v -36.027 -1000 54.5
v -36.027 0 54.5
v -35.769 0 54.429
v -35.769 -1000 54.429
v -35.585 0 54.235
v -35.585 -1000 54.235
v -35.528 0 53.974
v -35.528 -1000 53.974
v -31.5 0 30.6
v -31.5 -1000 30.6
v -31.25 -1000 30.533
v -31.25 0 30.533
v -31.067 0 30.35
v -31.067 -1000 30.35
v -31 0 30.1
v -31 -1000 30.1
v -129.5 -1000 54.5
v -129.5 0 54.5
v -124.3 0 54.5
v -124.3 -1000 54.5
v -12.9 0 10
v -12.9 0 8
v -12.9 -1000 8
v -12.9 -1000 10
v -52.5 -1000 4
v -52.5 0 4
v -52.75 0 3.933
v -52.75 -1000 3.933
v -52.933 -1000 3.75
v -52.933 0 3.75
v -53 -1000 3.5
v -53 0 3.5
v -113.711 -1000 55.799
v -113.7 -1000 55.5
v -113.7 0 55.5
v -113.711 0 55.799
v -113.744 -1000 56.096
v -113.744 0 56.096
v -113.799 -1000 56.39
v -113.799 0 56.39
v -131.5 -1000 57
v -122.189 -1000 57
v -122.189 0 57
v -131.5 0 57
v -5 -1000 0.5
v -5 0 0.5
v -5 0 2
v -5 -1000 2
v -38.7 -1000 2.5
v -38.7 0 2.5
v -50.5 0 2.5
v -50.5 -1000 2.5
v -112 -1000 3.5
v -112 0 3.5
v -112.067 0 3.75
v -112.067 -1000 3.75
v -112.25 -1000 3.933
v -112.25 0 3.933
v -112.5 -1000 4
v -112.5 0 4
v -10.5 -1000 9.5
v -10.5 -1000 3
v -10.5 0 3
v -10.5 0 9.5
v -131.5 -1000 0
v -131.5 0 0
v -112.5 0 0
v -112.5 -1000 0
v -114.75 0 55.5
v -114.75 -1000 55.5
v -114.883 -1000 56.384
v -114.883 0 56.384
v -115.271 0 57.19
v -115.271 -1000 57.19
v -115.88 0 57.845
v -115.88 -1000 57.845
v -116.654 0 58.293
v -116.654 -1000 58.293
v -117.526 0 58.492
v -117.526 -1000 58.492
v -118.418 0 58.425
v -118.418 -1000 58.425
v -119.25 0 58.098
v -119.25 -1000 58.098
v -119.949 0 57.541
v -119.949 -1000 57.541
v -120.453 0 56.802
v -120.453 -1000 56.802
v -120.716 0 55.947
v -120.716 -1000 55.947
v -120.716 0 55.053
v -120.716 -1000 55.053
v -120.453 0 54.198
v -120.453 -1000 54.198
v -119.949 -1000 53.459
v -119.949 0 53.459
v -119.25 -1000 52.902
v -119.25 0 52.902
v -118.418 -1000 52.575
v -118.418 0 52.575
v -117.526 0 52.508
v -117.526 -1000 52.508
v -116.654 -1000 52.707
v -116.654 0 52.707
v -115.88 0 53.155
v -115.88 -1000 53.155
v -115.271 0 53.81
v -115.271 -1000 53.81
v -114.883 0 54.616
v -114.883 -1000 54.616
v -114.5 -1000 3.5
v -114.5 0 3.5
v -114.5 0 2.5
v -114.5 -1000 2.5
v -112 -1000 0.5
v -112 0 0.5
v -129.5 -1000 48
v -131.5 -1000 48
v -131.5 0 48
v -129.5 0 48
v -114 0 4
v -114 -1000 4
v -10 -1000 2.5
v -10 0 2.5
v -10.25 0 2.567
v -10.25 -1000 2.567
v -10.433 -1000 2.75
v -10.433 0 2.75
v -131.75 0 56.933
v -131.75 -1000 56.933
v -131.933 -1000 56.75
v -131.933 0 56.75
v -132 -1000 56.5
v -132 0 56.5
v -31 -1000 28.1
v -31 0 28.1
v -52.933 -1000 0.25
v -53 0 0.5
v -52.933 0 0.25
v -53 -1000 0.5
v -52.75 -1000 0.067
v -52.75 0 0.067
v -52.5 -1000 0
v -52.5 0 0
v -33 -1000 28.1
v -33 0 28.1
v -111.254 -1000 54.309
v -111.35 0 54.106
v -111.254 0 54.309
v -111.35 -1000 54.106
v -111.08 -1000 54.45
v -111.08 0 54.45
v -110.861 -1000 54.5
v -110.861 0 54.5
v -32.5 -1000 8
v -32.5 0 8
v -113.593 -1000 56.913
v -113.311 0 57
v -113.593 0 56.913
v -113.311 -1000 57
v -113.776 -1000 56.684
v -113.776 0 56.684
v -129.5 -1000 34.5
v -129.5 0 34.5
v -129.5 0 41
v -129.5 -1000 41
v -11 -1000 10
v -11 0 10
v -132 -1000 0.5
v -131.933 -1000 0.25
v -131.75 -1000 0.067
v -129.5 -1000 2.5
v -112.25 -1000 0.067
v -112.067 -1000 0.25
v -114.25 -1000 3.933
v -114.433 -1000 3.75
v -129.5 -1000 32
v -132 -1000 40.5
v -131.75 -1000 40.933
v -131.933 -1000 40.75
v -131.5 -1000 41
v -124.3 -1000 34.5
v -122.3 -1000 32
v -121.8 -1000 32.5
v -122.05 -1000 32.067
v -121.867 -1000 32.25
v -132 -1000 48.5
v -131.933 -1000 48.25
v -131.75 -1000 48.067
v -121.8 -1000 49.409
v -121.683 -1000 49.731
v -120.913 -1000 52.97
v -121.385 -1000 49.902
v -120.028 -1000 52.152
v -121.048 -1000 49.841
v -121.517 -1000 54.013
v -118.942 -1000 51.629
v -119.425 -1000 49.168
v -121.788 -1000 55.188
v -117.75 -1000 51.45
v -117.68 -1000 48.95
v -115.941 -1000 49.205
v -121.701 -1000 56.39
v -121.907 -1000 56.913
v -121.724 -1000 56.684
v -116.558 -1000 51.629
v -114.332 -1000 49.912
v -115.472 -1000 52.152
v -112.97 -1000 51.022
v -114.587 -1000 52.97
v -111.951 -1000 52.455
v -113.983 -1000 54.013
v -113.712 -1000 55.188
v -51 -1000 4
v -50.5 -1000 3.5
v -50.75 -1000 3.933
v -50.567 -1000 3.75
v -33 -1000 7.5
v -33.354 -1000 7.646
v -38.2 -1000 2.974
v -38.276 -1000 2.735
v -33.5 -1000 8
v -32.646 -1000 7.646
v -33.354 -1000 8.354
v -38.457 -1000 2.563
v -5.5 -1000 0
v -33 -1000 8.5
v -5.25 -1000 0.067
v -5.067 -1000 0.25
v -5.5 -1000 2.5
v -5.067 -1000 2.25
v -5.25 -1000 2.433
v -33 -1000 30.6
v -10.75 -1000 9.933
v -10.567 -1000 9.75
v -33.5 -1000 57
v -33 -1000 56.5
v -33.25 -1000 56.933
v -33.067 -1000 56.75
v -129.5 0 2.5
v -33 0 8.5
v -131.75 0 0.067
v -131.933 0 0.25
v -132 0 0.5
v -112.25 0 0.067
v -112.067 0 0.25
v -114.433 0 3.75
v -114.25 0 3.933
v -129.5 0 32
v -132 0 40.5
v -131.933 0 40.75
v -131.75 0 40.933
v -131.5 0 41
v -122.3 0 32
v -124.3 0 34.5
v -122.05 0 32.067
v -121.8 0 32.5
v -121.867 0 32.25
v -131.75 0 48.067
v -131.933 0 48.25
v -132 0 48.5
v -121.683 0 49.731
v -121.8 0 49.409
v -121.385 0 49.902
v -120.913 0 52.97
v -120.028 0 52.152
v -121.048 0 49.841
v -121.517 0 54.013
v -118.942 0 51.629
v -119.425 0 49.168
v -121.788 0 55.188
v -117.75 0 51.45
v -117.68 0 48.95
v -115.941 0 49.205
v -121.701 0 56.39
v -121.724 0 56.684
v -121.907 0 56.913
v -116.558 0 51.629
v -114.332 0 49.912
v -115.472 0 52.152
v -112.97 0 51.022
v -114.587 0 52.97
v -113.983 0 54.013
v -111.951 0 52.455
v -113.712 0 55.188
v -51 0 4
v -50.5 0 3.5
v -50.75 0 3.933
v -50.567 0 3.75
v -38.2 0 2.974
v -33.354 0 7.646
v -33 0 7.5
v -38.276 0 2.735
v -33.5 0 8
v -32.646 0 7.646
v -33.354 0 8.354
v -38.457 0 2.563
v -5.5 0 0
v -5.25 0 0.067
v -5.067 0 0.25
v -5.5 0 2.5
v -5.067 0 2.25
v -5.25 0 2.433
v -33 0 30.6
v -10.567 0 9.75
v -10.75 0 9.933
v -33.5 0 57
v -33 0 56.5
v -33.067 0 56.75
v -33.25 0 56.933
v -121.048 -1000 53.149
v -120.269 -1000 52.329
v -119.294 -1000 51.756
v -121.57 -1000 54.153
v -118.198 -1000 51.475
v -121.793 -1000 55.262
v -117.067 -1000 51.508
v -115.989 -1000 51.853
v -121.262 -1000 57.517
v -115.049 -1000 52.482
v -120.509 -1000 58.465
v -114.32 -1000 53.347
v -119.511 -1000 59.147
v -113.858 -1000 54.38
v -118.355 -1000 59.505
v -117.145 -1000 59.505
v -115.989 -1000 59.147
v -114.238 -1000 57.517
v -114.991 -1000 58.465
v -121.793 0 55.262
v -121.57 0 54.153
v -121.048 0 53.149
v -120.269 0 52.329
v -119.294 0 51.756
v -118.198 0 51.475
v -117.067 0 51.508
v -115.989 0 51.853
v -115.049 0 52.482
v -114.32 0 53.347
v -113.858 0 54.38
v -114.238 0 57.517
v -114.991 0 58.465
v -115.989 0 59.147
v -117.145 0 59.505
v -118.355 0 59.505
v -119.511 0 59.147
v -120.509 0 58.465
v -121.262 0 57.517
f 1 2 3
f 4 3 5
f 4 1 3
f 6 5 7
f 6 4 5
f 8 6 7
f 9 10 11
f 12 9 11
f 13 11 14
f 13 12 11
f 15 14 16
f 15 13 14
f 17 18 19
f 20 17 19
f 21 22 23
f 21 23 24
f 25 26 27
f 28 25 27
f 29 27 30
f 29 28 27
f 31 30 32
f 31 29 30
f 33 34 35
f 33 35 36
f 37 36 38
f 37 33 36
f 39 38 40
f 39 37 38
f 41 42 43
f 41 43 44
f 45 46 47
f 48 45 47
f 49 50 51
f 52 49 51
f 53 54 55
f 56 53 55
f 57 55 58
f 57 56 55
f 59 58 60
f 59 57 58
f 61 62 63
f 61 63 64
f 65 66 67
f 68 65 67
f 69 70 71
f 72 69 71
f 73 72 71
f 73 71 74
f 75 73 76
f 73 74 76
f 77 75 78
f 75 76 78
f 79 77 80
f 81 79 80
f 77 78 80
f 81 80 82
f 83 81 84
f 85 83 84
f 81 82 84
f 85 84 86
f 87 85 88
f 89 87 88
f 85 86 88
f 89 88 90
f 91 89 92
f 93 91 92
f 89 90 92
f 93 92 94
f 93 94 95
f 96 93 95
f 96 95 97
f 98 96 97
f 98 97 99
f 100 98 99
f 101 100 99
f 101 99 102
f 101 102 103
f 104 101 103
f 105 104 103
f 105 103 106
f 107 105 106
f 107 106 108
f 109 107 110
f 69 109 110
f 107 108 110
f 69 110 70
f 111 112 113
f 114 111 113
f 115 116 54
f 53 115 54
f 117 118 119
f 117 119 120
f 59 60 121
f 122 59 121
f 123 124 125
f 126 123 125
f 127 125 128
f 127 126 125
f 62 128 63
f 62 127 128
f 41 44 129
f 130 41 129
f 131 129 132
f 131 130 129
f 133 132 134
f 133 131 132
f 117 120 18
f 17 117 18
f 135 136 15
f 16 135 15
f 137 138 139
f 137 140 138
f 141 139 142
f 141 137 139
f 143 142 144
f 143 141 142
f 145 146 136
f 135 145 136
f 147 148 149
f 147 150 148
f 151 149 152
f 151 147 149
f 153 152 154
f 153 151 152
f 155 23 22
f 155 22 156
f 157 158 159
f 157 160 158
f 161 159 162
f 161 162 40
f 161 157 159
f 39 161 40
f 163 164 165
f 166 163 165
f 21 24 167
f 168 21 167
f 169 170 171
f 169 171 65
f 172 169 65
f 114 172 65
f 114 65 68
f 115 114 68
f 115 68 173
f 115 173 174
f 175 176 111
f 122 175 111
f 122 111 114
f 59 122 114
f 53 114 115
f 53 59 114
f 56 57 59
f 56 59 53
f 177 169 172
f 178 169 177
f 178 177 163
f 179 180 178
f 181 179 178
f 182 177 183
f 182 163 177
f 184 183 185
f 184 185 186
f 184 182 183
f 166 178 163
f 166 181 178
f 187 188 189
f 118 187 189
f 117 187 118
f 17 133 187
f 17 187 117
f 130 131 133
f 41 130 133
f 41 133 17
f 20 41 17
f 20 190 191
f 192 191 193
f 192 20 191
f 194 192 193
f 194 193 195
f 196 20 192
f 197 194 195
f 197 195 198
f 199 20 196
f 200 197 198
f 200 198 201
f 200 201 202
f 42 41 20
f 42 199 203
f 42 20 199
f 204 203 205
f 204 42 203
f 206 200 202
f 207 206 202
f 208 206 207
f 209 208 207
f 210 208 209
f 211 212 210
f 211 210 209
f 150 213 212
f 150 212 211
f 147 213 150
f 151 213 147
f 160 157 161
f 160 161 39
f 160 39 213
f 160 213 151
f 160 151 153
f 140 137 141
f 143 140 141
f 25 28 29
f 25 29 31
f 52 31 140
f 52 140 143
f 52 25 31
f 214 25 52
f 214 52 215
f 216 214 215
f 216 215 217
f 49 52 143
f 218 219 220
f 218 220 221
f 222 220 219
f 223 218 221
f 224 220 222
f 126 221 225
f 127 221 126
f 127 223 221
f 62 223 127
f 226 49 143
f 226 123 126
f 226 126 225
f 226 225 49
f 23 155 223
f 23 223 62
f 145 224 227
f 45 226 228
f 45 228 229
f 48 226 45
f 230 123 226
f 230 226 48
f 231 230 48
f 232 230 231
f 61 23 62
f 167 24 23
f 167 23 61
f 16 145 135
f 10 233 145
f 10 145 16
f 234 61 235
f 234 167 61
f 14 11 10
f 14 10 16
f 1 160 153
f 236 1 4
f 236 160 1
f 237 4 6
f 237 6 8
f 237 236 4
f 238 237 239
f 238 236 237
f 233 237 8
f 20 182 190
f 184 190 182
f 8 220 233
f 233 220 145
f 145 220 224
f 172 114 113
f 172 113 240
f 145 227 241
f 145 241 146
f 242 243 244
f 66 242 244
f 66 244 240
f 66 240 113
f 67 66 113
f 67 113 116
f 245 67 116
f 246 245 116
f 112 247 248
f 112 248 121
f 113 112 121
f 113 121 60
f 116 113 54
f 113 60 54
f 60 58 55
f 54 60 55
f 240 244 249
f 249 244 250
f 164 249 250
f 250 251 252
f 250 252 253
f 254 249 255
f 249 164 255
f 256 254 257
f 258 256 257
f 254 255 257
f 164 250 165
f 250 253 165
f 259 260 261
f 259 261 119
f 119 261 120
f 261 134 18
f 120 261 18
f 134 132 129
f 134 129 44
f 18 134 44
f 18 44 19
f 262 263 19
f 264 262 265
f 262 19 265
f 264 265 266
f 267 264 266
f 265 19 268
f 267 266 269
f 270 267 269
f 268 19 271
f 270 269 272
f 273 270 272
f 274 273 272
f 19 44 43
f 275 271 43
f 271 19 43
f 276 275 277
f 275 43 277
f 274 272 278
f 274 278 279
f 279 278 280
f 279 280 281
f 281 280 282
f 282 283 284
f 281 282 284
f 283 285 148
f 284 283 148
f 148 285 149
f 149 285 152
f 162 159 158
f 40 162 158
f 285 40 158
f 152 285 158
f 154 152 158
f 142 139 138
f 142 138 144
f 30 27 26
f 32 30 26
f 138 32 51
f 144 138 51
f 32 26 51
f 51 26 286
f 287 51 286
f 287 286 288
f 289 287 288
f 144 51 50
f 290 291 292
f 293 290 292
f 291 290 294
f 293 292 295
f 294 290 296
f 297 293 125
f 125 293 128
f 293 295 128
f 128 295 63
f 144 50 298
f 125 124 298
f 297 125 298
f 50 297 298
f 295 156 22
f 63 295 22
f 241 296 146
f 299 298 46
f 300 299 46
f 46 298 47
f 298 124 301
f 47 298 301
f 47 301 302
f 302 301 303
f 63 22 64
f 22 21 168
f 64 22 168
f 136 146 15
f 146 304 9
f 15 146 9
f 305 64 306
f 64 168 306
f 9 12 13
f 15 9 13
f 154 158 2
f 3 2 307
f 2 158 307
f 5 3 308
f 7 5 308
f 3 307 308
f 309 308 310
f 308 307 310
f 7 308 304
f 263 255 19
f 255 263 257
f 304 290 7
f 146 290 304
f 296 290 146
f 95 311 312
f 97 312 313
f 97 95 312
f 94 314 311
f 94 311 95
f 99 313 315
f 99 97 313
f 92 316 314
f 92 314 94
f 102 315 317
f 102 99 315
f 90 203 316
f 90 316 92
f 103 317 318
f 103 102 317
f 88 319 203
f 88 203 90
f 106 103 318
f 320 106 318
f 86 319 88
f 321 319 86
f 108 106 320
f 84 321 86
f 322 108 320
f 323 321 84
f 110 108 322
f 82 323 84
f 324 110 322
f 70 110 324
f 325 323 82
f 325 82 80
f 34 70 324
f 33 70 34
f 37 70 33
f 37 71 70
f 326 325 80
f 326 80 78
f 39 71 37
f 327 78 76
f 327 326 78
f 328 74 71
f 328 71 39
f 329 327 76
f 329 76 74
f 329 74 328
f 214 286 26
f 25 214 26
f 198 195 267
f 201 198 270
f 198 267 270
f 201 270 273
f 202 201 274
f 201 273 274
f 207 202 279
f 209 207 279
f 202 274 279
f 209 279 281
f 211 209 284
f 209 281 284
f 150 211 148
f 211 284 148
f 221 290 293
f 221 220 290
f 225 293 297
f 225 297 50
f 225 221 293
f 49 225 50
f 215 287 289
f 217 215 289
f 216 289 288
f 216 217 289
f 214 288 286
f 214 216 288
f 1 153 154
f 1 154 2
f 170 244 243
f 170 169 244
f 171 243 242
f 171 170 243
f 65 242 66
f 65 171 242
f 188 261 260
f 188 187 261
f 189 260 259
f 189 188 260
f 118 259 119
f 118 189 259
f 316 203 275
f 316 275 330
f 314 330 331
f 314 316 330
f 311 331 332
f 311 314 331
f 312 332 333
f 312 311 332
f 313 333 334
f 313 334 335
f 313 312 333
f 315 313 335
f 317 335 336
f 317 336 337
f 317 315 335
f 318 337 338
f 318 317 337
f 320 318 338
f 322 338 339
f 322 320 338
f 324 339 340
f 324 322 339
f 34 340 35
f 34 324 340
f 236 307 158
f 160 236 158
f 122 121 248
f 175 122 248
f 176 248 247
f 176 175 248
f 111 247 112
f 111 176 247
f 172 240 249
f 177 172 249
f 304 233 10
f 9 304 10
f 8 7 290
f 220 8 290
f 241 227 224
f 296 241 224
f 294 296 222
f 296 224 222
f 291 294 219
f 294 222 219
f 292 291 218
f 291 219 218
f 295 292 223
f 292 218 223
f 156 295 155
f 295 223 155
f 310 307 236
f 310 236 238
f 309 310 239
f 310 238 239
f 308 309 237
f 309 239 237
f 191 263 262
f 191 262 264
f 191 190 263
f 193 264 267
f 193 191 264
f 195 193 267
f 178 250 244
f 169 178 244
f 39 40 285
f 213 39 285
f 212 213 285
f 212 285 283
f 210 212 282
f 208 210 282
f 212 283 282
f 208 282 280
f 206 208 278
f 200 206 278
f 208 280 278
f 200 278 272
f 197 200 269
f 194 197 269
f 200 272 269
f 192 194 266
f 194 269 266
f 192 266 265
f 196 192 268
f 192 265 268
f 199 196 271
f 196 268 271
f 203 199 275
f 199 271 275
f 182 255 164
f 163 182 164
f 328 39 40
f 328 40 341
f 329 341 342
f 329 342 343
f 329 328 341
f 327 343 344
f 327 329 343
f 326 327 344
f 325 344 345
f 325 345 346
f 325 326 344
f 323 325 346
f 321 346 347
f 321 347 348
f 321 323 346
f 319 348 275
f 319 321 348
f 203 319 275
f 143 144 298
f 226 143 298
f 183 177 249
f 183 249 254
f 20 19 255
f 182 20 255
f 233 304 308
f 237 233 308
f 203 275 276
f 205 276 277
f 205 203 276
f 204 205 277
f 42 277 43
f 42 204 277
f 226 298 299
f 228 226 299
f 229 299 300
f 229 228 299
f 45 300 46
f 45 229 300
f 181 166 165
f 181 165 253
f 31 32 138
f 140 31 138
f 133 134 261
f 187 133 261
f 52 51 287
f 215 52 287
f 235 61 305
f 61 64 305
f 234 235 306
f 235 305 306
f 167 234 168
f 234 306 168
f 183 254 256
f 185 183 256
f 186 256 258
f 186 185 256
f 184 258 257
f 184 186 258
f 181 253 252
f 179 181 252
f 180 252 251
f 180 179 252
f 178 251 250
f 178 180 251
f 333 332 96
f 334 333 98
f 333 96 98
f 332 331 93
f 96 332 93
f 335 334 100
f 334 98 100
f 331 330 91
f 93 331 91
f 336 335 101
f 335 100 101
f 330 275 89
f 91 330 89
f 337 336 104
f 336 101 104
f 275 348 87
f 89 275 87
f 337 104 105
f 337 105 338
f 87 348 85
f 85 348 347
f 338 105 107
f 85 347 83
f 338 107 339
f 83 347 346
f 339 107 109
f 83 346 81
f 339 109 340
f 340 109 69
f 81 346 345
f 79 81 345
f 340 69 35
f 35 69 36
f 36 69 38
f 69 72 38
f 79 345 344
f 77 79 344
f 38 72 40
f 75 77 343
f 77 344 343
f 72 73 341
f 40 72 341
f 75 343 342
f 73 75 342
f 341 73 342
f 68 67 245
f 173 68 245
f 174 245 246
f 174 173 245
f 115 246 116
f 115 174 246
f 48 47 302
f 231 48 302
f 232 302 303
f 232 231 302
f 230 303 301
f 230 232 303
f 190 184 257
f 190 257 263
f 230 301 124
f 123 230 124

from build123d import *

# Parameters (mm, degrees)
F1_DEPTH = 1000
F2_R     = 0.5
F4_DEPTH = 1000
F5_W     = 2
F5_H     = 2.5
F5_W_2   = 2.4
F5_H_2   = 2
F6_DEPTH = 1000
F7_R     = 0.5
F8_R     = 3
F9_DEPTH = 1000


# Not quite as in the source:
# - a feature names something its author has since deleted; it is built from what else it names


with BuildPart() as f1:
    # F0 (on Front) → F1 (new body)
    with BuildSketch(Plane.XZ):
        with BuildLine():
            Line((-33, 57), (-113.9880191388, 57))
            ThreePointArc((-113.9880191388, 57), (-117.75, 51.45), (-121.5119808612, 57))
            Line((-121.5119808612, 57), (-132, 57))
            Line((-132, 57), (-132, 48))
            Line((-132, 48), (-129.5, 48))
            Line((-129.5, 48), (-129.5, 54.5))
            Line((-129.5, 54.5), (-124.3, 54.5))
            Line((-124.3, 54.5), (-124.3, 34.5))
            Line((-124.3, 34.5), (-129.5, 34.5))
            Line((-129.5, 34.5), (-129.5, 41))
            Line((-129.5, 41), (-132, 41))
            Line((-132, 41), (-132, 0))
            Line((-132, 0), (-112, 0))
            Line((-112, 0), (-112, 4))
            Line((-112, 4), (-114.5, 4))
            Line((-114.5, 4), (-114.5, 2.5))
            Line((-114.5, 2.5), (-129.5, 2.5))
            Line((-129.5, 2.5), (-129.5, 32))
            Line((-129.5, 32), (-121.8, 32))
            Line((-121.8, 32), (-121.8, 50.3521849295))
            ThreePointArc((-121.8, 50.3521849295), (-115.3481082383, 49.4062806132), (-111.2767859606, 54.5))
            Line((-111.2767859606, 54.5), (-35.5, 54.5))
            Line((-35.5, 54.5), (-38.2252045227, 2.5))
            Line((-38.2252045227, 2.5), (-50.5, 2.5))
            Line((-50.5, 2.5), (-50.5, 4))
            Line((-50.5, 4), (-53, 4))
            Line((-53, 4), (-53, 0))
            Line((-53, 0), (-5, 0))
            Line((-5, 0), (-5, 2.5))
            Line((-5, 2.5), (-10.5, 2.5))
            Line((-10.5, 2.5), (-10.5, 8))
            Line((-10.5, 8), (-33, 8))
            Line((-33, 8), (-33, 57))
        make_face()
    extrude(amount=F1_DEPTH)

    # F2
    f2_edges = [f1.edges().sort_by_distance(p)[0] for p in [
        (-132, -500, 57),
        (-132, -500, 41),
        (-112, -500, 0),
        (-33, -500, 57),
        (-121.511981, -500, 57),
        (-113.988019, -500, 57),
        (-132, -500, 48),
        (-114.5, -500, 4),
        (-112, -500, 4),
        (-53, -500, 4),
        (-50.5, -500, 4),
        (-53, -500, 0),
        (-132, -500, 0),
        (-121.8, -500, 32),
        (-38.225205, -500, 2.5),
        (-35.5, -500, 54.5),
        (-111.276786, -500, 54.5),
        (-121.8, -500, 50.352185),
        (-5, -500, 0),
        (-5, -500, 2.5),
        (-10.5, -500, 2.5),
    ]]
    fillet(f2_edges, radius=F2_R)

    # F3 (on face) → F4 (cut)
    with BuildSketch(Plane.XZ.offset(1000)):
        with BuildLine():
            ThreePointArc((-33, 8.5), (-33.3535533906, 7.6464466094), (-32.5, 8))
            Line((-32.5, 8), (-33, 8))
            Line((-33, 8), (-33, 8.5))
        make_face()
    extrude(amount=-F4_DEPTH, mode=Mode.SUBTRACT)

    # F5 (on face) → F6 (join)
    with BuildSketch(Plane.XZ.offset(1000)):
        with Locations((-32, 29.35)):
            Rectangle(F5_W, F5_H)
        with Locations((-11.7, 9)):
            Rectangle(F5_W_2, F5_H_2)
    extrude(amount=-F6_DEPTH)

    # F7
    f7_edges = [f1.edges().sort_by_distance(p)[0] for p in [
        (-31, -500, 30.6),
        (-10.5, -500, 10),
    ]]
    fillet(f7_edges, radius=F7_R)


with BuildPart() as f9:
    # F8 (on face) → F9 (new body)
    with BuildSketch(Plane.XZ.offset(1000)):
        with BuildLine():
            ThreePointArc((-121.7009751181, 56.3901098901), (-118.1978006096, 51.4748323496), (-113.7, 55.5))
            ThreePointArc((-113.7, 55.5), (-113.7248323496, 55.9478006096), (-113.7990248819, 56.3901098901))
            ThreePointArc((-113.7990248819, 56.3901098901), (-117.75, 59.55), (-121.7009751181, 56.3901098901))
        make_face()
        with Locations((-117.75, 55.5)):
            Circle(F8_R, mode=Mode.SUBTRACT)
    extrude(amount=-F9_DEPTH)


solid = Compound([f1.part, f9.part])
